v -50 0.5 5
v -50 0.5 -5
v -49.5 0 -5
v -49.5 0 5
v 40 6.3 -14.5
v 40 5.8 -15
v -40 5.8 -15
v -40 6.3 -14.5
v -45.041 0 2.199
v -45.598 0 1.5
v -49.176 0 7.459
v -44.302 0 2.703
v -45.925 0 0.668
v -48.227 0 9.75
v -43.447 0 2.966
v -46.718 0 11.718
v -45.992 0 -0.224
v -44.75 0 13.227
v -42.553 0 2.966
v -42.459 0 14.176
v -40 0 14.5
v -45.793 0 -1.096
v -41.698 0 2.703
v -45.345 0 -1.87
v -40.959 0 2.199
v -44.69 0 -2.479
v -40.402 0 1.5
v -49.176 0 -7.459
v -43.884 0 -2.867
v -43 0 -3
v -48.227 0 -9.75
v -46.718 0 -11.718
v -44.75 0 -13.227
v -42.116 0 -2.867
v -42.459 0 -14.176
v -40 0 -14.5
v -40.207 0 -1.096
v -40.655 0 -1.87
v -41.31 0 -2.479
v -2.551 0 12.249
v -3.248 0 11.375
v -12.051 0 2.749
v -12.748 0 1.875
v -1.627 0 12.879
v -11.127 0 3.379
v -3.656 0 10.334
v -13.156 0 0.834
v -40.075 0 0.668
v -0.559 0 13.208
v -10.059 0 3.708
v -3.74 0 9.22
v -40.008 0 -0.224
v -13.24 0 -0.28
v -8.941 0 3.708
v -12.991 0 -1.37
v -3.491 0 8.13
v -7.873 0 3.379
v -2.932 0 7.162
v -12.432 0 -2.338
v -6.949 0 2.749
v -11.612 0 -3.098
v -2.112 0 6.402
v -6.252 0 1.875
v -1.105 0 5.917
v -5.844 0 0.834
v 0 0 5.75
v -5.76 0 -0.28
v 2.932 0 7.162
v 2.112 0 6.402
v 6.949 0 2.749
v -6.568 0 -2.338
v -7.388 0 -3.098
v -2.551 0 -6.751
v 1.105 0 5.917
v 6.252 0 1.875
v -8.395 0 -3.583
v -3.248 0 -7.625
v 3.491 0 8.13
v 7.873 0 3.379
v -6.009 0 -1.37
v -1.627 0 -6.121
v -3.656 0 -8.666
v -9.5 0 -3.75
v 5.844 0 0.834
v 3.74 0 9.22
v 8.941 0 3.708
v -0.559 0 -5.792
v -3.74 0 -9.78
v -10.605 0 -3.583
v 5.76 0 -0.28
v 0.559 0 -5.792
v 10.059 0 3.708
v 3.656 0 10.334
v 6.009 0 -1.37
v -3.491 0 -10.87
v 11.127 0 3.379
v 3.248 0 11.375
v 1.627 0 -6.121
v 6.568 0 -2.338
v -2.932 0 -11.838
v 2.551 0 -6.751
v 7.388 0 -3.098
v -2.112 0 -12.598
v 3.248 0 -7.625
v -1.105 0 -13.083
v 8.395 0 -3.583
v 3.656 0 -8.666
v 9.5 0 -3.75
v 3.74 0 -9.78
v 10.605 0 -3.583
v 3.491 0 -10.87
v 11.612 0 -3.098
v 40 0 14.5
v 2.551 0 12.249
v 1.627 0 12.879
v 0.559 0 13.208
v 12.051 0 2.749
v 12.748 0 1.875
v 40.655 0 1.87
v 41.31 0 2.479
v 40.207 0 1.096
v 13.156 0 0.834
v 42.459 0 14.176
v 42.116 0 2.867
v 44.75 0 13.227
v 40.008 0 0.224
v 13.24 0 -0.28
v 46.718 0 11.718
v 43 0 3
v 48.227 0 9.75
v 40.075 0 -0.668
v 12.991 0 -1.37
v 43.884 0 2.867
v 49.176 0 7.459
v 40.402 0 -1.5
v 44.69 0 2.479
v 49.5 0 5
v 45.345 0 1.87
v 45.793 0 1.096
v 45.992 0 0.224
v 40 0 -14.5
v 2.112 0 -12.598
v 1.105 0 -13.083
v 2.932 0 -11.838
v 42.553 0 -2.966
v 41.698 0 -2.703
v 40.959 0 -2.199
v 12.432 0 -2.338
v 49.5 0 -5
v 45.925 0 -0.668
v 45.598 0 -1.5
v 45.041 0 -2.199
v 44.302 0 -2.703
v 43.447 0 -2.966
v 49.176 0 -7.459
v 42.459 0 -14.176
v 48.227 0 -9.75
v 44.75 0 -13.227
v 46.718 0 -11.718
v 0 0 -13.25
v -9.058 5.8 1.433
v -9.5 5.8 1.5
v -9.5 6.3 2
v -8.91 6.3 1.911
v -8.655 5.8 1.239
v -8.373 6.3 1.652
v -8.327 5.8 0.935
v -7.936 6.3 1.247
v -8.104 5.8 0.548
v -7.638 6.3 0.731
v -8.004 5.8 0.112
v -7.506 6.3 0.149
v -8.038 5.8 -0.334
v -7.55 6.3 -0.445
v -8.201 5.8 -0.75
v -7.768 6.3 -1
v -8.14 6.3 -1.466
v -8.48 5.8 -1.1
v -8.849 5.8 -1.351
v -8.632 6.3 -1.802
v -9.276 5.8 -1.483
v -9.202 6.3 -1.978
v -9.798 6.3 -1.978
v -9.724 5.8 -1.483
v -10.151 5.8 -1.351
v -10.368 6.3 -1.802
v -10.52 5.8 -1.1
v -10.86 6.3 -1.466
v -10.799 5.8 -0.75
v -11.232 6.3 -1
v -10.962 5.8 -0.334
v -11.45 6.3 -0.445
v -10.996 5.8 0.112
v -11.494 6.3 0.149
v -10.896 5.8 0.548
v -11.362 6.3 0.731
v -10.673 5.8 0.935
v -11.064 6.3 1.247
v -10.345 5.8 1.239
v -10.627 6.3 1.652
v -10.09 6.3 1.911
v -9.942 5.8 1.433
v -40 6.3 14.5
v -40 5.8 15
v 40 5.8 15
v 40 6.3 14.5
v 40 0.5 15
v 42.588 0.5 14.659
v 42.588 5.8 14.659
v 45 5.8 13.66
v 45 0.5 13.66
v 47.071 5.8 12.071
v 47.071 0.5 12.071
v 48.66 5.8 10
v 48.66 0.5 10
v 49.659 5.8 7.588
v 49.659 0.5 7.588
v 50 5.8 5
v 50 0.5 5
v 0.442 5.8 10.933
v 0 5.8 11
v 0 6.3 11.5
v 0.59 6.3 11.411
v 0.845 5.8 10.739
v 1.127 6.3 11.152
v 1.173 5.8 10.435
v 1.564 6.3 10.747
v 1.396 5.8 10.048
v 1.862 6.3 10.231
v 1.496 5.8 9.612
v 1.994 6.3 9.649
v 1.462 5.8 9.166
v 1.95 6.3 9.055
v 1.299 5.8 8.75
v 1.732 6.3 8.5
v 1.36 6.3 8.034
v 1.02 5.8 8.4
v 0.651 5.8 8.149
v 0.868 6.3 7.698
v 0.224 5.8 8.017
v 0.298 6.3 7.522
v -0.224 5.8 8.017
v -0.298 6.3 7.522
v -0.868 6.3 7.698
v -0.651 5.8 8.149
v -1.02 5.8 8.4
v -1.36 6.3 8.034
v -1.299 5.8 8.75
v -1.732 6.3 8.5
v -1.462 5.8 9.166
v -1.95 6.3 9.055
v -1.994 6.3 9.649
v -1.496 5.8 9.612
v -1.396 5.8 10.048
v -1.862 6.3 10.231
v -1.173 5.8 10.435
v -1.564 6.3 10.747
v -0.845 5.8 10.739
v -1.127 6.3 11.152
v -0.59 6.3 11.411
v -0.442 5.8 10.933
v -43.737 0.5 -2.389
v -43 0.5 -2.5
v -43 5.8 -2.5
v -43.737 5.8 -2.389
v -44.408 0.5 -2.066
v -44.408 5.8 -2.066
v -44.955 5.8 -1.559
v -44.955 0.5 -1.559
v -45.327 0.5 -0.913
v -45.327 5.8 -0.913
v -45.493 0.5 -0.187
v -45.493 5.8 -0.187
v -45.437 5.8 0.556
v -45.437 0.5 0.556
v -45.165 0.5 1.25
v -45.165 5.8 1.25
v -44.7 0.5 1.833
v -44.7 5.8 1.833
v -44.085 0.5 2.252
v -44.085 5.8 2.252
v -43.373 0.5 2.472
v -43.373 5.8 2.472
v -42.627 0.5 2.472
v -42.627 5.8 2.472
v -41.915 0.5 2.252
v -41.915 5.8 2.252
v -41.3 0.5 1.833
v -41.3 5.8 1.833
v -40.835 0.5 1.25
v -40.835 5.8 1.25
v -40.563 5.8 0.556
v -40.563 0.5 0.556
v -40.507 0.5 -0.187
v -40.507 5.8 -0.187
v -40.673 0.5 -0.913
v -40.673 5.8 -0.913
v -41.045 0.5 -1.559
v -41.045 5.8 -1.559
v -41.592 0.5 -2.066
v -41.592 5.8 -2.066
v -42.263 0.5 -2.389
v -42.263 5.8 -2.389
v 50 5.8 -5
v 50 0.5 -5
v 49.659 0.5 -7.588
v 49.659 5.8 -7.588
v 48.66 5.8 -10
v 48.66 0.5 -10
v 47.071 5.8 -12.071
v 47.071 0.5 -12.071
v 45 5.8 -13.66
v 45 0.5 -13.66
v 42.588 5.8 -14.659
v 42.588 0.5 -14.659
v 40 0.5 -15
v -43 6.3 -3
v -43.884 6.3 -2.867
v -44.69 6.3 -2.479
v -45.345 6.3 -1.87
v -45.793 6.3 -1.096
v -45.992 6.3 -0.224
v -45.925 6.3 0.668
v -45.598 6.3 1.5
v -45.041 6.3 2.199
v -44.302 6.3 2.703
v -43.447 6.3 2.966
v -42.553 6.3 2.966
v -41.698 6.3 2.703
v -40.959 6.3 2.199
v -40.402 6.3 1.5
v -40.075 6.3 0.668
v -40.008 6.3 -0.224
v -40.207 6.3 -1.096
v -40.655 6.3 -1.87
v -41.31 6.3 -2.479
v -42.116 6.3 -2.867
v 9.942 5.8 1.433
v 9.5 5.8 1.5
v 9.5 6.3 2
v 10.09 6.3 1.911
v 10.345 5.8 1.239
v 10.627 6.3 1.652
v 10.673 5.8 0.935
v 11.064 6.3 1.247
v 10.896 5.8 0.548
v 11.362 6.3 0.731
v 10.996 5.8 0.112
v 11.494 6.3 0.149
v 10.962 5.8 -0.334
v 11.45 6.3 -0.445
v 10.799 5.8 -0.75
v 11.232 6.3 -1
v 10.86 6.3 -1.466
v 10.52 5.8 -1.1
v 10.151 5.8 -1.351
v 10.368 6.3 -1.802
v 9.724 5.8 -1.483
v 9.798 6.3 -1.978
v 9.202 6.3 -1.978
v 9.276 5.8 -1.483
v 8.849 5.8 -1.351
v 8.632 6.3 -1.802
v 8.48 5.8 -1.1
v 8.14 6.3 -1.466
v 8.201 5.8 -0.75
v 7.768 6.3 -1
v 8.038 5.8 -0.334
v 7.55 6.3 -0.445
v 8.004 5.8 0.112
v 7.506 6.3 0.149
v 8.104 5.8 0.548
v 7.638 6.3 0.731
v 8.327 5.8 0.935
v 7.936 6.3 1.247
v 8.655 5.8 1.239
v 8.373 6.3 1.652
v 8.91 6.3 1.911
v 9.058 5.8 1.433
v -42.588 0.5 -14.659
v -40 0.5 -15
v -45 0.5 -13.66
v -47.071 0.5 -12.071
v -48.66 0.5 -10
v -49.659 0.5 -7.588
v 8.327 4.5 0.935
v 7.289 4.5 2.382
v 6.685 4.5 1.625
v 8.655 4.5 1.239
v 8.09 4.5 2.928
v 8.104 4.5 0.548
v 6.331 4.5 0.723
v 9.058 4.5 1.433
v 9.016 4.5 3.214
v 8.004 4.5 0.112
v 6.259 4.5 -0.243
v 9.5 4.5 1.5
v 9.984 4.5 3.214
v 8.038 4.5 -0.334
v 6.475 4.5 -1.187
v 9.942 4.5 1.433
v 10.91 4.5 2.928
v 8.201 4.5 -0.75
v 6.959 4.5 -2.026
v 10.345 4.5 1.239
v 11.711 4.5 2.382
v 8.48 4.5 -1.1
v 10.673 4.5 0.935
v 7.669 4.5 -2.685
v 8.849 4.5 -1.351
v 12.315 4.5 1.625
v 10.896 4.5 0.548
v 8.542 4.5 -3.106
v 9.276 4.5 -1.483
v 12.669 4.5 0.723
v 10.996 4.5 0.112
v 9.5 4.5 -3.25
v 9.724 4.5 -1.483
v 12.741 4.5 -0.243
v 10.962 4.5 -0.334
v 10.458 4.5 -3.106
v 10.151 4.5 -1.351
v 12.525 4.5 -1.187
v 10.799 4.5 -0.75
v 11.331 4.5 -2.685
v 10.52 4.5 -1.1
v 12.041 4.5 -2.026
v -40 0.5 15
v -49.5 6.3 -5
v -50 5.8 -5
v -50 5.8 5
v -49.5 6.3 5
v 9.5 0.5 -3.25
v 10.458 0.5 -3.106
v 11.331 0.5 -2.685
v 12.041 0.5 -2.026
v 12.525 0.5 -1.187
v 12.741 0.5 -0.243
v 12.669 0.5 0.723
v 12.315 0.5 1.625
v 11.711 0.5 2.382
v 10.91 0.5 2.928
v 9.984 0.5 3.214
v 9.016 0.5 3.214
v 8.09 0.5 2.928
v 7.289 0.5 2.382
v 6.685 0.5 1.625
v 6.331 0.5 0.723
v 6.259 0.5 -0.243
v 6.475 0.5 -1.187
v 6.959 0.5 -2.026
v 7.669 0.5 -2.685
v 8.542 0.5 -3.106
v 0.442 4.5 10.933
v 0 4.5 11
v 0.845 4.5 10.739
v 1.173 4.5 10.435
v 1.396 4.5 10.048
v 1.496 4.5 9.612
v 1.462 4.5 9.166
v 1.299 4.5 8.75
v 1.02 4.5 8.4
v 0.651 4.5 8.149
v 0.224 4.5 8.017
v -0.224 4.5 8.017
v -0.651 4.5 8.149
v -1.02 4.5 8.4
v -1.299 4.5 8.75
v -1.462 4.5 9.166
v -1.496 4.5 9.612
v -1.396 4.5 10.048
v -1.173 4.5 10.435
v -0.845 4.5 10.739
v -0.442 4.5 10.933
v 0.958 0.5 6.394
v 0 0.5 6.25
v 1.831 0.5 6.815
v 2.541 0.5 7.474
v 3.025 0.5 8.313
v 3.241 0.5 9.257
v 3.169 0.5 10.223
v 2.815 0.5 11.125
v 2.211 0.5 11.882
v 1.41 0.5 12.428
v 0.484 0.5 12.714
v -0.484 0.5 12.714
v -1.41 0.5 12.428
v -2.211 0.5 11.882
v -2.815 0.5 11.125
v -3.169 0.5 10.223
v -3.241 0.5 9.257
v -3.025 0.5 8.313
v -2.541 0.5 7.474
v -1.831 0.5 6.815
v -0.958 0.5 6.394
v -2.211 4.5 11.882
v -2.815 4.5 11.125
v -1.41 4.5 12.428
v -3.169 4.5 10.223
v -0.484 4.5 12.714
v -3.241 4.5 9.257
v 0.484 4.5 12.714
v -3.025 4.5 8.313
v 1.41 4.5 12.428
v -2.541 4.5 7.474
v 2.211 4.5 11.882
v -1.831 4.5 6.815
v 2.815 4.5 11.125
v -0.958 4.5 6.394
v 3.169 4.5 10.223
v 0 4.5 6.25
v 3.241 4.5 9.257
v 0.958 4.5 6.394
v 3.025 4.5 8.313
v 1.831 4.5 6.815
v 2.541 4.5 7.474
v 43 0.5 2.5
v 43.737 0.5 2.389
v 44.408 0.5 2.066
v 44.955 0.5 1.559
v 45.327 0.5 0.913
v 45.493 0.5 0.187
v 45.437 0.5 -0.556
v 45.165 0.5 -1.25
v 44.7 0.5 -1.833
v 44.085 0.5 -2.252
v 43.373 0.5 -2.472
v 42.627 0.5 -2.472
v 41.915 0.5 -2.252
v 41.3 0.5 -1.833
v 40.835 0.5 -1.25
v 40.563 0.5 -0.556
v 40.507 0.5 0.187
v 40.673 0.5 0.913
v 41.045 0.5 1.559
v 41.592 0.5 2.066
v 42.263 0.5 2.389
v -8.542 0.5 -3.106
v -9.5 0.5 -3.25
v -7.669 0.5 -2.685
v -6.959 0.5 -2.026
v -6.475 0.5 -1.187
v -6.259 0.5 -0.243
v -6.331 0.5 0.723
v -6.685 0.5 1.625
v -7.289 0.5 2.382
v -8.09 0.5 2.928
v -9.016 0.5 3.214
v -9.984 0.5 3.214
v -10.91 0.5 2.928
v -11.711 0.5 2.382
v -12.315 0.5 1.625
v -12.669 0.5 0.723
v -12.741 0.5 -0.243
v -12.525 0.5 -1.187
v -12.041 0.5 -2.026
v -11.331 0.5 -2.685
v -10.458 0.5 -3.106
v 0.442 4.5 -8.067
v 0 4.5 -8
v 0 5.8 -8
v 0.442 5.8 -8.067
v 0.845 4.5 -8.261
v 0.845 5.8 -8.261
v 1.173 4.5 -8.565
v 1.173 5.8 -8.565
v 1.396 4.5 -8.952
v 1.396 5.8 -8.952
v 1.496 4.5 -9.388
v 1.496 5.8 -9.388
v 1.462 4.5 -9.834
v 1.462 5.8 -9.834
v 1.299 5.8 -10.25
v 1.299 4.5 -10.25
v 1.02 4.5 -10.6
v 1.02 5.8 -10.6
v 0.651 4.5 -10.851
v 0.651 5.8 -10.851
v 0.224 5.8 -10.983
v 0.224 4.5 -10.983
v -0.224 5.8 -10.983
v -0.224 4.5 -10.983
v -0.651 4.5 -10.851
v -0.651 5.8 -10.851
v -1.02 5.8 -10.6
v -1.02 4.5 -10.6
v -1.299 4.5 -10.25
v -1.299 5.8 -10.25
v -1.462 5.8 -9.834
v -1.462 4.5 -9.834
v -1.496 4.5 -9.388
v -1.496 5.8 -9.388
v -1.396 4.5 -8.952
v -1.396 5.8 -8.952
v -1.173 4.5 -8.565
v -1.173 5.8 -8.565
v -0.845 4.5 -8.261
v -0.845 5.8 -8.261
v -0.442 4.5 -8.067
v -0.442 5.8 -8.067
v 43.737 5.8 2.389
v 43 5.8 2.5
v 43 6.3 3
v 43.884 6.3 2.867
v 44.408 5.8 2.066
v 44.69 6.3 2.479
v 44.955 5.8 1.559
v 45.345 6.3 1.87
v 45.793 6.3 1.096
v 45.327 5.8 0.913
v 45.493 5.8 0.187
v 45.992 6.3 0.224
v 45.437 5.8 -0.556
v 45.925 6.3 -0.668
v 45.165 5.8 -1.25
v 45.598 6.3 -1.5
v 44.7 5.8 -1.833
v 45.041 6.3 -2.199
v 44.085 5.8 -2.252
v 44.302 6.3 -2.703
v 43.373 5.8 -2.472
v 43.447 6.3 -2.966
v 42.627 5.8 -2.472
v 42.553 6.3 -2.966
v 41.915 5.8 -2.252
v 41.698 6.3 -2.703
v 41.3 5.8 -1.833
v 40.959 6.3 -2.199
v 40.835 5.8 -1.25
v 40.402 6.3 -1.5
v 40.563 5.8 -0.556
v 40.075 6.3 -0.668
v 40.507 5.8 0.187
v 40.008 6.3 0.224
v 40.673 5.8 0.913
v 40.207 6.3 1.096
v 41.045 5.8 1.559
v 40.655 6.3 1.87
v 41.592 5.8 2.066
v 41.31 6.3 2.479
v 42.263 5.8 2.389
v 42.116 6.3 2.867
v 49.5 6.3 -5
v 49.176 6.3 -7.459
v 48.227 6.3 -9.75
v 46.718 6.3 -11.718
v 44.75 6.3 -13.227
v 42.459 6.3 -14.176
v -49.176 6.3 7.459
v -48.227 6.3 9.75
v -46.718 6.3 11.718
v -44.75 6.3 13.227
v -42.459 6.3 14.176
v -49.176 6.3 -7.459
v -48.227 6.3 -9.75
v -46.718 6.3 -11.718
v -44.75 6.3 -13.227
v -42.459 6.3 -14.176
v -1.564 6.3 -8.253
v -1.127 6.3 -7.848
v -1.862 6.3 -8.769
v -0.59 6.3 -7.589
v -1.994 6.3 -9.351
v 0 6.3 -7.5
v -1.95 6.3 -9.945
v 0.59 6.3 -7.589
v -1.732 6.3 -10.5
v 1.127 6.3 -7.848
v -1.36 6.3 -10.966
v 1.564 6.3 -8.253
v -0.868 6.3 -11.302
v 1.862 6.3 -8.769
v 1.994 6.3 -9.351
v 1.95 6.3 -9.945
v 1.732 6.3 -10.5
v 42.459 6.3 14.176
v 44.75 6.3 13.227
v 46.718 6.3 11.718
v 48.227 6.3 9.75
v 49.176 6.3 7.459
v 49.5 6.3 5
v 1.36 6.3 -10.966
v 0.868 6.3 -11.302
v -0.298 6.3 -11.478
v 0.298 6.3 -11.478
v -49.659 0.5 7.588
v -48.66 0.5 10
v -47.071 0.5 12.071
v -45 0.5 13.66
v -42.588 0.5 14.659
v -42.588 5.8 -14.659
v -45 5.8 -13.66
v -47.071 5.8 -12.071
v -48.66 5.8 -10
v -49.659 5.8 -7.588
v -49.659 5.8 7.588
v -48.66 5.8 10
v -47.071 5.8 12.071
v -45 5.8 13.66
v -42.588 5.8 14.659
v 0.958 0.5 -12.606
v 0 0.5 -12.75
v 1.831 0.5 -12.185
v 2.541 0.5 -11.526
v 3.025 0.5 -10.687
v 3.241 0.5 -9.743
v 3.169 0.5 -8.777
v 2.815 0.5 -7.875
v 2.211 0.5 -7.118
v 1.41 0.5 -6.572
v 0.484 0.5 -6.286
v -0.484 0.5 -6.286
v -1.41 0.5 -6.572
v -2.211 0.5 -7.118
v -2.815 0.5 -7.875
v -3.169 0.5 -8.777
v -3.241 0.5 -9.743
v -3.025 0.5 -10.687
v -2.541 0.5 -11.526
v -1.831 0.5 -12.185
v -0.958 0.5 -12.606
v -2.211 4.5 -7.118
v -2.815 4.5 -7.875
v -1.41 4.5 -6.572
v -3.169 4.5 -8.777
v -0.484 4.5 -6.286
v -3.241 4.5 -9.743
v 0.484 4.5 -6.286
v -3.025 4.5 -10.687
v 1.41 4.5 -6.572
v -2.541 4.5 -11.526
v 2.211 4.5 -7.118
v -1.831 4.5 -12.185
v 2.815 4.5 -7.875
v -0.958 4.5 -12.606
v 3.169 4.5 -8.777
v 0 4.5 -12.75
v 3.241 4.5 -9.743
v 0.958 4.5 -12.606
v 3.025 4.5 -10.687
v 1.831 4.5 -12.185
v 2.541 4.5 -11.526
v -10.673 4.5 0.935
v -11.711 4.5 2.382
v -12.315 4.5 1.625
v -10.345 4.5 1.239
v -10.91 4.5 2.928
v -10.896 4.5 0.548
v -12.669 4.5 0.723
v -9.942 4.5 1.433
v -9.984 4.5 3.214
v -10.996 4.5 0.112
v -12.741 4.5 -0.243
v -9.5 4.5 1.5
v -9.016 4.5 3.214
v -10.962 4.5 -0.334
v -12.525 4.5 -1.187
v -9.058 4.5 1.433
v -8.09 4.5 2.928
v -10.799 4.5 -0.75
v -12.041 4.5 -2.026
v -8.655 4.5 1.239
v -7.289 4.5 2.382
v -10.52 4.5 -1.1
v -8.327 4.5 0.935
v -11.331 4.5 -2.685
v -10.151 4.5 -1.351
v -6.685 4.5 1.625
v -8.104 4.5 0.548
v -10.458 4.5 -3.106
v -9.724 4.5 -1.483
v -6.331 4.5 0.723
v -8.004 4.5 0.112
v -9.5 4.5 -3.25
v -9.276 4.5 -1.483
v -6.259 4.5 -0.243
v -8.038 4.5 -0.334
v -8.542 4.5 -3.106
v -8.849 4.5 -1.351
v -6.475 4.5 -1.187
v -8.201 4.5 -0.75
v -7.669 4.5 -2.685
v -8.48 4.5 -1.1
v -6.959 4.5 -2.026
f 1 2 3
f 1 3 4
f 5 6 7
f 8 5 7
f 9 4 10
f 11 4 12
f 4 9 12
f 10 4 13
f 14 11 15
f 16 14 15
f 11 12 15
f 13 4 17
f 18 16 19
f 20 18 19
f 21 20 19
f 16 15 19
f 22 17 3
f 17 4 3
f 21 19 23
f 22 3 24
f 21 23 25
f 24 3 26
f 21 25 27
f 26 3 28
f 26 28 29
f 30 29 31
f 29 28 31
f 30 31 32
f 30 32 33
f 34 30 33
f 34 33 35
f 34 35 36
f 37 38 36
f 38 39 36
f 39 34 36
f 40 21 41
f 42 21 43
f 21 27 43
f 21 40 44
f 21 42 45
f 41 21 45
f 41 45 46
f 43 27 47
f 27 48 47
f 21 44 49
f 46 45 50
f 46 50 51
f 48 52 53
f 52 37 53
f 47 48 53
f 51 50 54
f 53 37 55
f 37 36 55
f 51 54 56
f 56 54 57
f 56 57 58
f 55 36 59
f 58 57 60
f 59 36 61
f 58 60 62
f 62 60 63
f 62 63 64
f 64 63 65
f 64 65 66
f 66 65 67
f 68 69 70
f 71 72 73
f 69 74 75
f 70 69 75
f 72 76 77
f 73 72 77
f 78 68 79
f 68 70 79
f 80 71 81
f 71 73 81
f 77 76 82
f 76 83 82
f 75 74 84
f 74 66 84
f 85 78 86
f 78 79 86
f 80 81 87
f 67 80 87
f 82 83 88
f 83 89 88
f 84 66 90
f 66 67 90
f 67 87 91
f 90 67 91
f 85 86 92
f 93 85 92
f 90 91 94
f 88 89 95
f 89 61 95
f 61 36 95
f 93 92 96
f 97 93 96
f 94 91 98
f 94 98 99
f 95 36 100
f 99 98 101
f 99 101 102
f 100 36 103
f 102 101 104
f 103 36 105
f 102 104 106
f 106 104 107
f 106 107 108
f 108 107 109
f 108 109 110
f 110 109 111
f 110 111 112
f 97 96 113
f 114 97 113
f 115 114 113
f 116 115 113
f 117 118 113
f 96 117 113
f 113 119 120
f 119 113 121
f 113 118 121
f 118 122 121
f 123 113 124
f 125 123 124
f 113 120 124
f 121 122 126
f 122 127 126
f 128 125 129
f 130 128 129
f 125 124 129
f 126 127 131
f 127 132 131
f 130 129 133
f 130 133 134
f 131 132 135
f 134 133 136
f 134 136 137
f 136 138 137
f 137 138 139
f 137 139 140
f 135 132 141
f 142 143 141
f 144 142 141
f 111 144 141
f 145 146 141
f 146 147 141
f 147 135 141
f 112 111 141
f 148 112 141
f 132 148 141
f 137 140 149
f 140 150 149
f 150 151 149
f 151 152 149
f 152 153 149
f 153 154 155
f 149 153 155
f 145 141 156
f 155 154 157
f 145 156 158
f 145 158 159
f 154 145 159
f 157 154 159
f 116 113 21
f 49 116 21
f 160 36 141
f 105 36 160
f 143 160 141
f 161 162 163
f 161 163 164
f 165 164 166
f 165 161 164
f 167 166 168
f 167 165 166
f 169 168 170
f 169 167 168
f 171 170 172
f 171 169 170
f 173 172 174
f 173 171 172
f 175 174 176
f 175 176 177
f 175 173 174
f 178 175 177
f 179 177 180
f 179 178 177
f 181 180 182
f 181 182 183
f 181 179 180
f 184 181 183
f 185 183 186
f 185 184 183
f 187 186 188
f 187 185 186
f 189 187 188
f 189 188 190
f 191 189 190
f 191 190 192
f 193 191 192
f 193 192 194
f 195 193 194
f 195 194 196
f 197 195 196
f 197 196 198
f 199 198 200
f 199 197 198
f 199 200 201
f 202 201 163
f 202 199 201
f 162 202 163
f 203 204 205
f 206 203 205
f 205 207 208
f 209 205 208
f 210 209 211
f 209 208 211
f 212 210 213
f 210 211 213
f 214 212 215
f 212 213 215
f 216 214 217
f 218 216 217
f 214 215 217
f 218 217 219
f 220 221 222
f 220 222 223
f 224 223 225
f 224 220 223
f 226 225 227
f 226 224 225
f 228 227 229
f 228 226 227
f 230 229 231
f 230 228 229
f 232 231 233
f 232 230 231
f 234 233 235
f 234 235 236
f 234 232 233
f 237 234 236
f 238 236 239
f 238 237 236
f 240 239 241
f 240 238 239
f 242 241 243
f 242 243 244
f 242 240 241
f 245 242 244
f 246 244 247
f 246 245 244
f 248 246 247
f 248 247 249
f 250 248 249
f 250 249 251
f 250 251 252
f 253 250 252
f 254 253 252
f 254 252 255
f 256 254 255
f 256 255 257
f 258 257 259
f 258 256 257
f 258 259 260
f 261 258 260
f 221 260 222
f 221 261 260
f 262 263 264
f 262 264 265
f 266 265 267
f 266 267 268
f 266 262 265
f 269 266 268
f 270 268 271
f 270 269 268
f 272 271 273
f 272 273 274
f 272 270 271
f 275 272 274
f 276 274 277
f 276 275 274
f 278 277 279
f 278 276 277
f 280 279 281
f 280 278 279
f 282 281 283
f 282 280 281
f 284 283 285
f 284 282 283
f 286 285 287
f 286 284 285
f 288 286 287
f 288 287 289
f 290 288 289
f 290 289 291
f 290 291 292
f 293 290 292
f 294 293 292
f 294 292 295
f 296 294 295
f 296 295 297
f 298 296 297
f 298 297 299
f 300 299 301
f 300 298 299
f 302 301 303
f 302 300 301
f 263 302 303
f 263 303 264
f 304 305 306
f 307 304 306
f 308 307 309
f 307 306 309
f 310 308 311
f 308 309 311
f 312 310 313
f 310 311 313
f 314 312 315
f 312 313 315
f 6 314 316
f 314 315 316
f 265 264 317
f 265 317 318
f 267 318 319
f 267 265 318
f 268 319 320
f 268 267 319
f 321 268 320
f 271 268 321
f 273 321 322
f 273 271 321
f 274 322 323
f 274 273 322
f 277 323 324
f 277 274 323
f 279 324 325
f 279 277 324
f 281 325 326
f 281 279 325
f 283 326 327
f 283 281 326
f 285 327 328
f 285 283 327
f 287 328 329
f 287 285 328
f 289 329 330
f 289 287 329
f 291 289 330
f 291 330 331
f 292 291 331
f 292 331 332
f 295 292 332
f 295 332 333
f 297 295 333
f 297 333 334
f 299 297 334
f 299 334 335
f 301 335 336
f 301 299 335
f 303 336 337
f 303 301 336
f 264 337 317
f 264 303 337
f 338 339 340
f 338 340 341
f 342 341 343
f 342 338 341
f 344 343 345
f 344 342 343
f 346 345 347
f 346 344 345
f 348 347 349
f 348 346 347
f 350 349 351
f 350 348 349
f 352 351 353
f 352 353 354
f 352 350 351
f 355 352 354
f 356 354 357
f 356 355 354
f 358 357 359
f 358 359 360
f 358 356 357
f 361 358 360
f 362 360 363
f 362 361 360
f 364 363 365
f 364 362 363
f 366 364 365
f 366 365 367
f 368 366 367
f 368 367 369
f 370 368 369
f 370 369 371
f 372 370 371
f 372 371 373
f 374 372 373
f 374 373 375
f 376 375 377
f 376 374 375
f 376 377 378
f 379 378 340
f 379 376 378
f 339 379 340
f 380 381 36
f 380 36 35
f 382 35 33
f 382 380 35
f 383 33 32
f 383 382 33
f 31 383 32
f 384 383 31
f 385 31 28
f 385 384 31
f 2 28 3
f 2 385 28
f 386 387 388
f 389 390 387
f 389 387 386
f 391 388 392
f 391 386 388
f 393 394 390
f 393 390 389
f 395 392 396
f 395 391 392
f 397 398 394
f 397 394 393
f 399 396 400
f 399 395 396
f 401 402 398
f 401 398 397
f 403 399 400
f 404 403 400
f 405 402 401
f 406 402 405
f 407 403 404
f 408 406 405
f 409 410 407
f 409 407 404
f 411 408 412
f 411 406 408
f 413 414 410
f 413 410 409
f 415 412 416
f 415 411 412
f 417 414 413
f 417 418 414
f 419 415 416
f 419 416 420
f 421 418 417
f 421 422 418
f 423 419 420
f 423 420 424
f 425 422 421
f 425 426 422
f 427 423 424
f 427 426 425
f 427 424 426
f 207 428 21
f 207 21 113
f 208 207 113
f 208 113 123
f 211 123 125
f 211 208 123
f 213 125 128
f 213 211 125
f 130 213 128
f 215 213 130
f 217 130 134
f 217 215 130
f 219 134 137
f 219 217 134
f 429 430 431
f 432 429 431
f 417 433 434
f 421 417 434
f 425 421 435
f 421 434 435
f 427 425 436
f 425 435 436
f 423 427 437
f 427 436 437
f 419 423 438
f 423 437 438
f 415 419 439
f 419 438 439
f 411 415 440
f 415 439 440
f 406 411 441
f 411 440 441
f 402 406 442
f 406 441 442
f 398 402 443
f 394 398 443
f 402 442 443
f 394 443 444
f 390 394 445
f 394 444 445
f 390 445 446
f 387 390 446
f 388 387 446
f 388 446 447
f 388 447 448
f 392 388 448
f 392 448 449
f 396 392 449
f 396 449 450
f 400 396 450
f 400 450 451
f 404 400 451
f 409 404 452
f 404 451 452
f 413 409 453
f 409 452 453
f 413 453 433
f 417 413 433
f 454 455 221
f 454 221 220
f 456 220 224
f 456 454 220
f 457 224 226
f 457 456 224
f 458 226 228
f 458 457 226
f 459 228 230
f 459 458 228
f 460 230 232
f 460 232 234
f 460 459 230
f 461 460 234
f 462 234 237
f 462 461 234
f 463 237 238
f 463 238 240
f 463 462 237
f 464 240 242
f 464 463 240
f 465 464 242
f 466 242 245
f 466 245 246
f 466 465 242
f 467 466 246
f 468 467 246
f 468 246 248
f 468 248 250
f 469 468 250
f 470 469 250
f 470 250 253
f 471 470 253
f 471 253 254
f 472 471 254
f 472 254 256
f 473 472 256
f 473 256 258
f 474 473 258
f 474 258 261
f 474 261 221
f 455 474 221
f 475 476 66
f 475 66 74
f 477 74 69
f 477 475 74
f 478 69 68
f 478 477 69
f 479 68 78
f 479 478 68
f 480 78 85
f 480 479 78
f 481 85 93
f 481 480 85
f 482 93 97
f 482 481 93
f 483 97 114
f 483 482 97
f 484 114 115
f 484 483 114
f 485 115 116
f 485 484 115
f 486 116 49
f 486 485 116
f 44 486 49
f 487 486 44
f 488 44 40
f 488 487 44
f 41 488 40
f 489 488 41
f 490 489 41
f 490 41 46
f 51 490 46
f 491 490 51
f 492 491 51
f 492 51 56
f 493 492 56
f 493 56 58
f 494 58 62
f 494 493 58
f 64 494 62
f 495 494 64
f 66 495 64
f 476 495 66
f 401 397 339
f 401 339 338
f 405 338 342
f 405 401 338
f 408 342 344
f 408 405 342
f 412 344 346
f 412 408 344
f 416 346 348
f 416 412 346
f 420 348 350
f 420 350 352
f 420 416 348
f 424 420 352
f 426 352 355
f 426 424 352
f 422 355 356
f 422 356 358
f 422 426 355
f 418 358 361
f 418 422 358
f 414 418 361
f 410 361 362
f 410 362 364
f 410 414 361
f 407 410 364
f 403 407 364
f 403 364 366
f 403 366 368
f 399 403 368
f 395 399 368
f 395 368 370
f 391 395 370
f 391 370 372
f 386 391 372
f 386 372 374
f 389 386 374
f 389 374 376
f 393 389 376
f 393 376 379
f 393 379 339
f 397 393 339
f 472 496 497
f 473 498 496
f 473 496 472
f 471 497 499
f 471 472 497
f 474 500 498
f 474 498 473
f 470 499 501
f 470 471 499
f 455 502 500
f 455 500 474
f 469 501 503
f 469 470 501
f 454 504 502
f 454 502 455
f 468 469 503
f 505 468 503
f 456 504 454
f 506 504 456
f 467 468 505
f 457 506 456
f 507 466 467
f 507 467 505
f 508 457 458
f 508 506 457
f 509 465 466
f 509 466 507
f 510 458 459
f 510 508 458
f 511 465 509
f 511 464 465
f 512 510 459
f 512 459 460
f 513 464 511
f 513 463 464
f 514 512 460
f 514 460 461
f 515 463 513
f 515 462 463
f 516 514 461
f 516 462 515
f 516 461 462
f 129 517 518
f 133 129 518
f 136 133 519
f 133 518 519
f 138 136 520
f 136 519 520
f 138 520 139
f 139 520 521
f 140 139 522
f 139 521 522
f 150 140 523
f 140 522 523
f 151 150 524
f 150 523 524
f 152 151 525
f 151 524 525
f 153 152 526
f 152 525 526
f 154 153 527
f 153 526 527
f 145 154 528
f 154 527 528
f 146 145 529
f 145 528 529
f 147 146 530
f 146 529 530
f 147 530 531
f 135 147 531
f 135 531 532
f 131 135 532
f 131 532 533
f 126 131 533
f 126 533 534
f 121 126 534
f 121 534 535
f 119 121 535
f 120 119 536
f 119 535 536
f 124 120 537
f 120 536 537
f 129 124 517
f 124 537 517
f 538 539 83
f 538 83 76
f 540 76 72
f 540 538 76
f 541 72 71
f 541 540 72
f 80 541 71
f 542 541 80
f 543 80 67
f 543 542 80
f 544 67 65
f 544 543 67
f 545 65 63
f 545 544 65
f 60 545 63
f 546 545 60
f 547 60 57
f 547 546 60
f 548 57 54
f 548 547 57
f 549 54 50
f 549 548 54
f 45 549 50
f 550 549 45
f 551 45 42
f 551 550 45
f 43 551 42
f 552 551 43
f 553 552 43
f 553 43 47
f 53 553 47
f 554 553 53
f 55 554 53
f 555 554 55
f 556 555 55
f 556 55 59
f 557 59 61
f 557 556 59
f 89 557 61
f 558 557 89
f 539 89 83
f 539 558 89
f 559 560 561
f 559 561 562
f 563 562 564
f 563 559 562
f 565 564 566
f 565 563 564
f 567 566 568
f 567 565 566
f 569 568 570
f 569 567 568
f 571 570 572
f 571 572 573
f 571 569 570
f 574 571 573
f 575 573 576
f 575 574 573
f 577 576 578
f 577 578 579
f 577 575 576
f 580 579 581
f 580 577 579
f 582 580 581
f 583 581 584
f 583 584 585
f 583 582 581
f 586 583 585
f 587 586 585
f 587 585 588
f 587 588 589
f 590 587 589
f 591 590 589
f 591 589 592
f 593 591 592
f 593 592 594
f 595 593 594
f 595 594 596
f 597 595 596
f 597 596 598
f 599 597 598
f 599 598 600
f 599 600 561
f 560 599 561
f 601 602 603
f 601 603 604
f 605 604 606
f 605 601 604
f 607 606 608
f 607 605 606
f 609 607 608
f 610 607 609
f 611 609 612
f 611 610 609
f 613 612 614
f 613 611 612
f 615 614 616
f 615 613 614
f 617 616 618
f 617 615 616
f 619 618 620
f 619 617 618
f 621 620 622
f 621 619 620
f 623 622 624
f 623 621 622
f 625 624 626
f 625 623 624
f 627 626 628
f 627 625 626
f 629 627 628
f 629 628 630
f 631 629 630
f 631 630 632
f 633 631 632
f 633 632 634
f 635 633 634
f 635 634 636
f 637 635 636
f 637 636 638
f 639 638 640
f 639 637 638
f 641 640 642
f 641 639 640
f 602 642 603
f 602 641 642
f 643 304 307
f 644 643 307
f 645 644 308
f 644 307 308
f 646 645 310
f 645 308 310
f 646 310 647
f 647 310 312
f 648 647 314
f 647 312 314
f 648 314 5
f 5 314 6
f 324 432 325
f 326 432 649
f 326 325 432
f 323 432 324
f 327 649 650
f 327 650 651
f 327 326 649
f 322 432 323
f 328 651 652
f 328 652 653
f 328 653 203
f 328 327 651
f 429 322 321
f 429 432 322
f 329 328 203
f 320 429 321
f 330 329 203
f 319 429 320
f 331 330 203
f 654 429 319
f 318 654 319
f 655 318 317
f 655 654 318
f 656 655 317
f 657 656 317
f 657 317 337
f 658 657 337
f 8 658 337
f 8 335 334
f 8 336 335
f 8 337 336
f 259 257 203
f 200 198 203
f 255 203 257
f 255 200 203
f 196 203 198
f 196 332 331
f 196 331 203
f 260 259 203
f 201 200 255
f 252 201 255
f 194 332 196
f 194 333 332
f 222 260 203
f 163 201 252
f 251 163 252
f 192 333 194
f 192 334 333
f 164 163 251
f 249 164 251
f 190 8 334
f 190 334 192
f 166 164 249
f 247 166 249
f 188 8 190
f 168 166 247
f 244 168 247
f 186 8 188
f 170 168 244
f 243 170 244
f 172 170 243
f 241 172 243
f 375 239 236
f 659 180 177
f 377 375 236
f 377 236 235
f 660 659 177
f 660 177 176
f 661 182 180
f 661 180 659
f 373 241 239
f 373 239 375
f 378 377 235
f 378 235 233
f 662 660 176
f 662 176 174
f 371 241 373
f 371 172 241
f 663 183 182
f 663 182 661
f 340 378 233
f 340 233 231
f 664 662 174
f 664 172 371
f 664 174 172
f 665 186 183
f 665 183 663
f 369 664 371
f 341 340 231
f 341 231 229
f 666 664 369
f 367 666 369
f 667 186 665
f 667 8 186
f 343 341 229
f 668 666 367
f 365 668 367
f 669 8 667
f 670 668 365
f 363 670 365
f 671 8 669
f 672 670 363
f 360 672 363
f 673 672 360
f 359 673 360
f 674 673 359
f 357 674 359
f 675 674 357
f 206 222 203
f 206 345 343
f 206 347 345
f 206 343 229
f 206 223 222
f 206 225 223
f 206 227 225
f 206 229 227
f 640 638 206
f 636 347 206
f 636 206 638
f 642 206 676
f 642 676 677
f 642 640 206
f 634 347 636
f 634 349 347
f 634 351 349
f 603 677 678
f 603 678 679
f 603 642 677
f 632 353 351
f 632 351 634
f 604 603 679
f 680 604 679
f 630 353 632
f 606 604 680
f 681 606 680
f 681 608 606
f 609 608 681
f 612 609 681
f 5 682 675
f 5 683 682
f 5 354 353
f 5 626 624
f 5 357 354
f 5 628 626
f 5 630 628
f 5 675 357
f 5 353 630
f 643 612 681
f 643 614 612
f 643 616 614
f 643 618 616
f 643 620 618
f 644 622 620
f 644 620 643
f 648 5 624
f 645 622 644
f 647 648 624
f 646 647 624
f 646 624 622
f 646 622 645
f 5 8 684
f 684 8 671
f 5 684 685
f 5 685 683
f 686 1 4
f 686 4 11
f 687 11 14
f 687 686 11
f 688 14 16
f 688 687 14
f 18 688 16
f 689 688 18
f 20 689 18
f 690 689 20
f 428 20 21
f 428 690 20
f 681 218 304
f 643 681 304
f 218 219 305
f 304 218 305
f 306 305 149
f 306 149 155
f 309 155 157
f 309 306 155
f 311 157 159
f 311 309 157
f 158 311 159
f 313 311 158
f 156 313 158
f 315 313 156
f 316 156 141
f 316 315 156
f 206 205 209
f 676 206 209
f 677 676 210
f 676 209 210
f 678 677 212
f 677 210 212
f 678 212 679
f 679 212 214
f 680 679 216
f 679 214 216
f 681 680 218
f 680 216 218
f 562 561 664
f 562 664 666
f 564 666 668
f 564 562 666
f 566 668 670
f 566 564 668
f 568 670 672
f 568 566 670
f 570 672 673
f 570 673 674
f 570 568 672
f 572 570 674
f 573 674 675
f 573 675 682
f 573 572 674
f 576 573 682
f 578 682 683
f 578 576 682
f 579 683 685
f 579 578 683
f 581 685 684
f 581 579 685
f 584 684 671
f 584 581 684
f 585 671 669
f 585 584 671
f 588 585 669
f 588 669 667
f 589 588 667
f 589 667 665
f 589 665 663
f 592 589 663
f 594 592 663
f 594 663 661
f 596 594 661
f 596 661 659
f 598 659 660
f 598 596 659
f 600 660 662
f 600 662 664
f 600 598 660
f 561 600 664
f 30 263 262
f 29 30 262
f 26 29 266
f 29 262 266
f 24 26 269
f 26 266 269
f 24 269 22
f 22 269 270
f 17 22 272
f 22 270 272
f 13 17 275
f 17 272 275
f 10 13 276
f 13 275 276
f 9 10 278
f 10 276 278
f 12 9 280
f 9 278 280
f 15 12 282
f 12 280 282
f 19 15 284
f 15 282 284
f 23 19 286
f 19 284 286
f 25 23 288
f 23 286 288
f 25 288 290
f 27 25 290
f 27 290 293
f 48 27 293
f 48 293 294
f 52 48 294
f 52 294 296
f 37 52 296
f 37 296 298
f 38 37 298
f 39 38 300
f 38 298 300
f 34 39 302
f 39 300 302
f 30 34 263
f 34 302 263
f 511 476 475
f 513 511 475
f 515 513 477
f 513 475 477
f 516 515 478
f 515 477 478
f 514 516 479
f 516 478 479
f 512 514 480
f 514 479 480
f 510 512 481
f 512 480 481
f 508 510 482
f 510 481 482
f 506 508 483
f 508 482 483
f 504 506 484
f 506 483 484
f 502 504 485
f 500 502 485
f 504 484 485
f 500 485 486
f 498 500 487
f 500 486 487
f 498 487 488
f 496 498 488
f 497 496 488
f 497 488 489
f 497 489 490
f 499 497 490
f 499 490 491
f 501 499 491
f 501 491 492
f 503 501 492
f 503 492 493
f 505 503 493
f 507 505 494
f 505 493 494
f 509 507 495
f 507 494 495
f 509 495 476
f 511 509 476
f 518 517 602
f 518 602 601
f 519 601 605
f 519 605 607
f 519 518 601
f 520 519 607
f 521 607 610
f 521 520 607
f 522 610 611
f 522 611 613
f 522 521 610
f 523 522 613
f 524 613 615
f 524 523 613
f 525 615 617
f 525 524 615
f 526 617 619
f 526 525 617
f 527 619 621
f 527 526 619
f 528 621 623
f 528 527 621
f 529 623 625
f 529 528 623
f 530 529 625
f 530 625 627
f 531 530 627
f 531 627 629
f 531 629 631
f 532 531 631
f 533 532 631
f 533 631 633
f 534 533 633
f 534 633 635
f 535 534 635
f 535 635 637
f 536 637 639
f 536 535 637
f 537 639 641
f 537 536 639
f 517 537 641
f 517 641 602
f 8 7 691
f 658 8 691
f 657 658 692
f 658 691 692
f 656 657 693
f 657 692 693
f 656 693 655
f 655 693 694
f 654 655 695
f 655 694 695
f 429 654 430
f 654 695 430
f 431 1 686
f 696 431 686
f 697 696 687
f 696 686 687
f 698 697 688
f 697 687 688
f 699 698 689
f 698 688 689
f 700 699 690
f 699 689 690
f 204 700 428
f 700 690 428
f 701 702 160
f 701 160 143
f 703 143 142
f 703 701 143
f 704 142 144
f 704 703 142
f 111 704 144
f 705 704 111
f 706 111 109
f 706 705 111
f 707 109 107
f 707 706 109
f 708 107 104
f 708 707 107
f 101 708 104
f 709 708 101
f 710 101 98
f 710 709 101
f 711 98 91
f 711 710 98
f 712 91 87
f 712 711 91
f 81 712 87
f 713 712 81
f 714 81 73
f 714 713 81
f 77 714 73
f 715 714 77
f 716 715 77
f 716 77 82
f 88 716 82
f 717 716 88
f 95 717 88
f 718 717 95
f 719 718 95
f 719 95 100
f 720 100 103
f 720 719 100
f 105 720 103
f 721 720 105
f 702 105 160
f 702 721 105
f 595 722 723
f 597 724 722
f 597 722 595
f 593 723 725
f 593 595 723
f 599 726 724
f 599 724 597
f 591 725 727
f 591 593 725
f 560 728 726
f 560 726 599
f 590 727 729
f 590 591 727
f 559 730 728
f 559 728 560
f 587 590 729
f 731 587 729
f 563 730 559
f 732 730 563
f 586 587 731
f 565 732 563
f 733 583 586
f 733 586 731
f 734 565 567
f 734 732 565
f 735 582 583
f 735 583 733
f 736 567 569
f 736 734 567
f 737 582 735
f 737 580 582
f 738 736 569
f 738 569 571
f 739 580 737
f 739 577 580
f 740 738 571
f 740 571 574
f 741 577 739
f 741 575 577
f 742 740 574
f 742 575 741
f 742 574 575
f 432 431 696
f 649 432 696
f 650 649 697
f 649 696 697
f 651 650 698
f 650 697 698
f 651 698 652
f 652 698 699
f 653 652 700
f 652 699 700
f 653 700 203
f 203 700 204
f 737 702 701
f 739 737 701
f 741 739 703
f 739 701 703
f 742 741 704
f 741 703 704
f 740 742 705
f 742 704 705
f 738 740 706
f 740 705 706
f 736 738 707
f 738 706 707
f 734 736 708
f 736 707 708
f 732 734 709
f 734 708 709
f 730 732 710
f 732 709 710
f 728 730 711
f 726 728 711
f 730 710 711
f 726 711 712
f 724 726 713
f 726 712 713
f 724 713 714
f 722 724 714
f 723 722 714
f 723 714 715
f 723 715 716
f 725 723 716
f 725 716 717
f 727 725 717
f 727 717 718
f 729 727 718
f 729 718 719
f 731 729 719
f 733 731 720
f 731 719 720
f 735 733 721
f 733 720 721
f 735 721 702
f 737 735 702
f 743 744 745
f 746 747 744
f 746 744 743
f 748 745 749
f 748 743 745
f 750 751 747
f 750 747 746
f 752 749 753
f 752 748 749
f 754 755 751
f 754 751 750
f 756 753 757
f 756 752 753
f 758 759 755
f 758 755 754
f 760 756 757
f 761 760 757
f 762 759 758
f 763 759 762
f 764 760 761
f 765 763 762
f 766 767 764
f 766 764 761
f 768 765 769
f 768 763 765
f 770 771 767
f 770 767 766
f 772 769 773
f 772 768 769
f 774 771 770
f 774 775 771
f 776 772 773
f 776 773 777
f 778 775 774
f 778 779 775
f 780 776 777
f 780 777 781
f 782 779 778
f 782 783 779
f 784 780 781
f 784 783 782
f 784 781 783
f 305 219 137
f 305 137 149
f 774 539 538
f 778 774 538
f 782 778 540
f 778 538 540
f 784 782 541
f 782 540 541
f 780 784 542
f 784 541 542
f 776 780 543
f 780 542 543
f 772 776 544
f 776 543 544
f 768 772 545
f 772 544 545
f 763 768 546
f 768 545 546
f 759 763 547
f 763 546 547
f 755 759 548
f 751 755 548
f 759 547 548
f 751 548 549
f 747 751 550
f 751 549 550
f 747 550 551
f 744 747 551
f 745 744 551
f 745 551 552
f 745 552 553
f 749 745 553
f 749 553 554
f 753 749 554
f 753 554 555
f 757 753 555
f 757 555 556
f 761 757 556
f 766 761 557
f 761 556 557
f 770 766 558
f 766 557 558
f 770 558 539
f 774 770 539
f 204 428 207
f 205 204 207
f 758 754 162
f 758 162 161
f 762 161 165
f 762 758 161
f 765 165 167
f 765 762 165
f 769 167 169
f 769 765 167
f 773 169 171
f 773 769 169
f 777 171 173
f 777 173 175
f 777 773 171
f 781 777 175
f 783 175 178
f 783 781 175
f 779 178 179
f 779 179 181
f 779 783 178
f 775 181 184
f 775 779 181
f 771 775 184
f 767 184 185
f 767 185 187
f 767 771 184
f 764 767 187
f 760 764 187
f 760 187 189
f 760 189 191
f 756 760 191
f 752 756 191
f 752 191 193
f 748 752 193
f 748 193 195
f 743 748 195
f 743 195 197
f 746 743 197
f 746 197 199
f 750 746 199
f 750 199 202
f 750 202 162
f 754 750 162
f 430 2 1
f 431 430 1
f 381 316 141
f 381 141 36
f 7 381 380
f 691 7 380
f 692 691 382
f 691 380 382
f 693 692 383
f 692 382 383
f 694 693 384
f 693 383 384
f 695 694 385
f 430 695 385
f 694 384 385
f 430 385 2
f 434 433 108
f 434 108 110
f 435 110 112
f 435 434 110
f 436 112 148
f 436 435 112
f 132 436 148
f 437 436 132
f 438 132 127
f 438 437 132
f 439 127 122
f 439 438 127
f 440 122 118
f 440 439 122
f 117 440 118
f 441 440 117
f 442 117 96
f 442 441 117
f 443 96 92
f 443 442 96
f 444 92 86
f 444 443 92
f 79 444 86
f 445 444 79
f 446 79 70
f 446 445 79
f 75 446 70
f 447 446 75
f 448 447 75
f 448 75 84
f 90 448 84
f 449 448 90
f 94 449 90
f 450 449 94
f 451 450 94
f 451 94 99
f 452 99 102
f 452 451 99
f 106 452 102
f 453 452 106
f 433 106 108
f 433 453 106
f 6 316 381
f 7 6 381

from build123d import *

# Parameters (mm, degrees)
SKETCH1_R           = 2.5
SKETCH1_R_2         = 1.5
BOSS_EXTRUDE1_DEPTH = 6.3
SKETCH2_R           = 3.25
CUT_EXTRUDE1_DEPTH  = 4.5
CHAMFER1_SIZE       = 0.5


with BuildPart() as part:
    # Sketch1 → Boss-Extrude1 (new body)
    with BuildSketch(Plane(origin=(0, 0, 0), x_dir=(1, 0, 0), z_dir=(0, 1, 0))):
        with BuildLine():
            Line((40, 15), (-40, 15))
            ThreePointArc((-40, 15), (-47.071067812, 12.071067812), (-50, 5))
            Line((-50, 5), (-50, -5))
            ThreePointArc((-50, -5), (-47.071067812, -12.071067812), (-40, -15))
            Line((-40, -15), (40, -15))
            ThreePointArc((40, -15), (47.071067812, -12.071067812), (50, -5))
            Line((50, -5), (50, 5))
            ThreePointArc((50, 5), (47.071067812, 12.071067812), (40, 15))
        make_face()
        with Locations(Location((43, 0, 0), (0, 0, 270))):
            Circle(SKETCH1_R, mode=Mode.SUBTRACT)
        with Locations(Location((-43, 0, 0), (0, 0, 90))):
            Circle(SKETCH1_R, mode=Mode.SUBTRACT)
        with Locations(Location((0, -9.5, 0), (0, 0, 270))):
            Circle(SKETCH1_R_2, mode=Mode.SUBTRACT)
        with Locations(Location((-9.5, 0, 0), (0, 0, 270))):
            Circle(SKETCH1_R_2, mode=Mode.SUBTRACT)
        with Locations(Location((0, 9.5, 0), (0, 0, 270))):
            Circle(SKETCH1_R_2, mode=Mode.SUBTRACT)
        with Locations(Location((9.5, 0, 0), (0, 0, 270))):
            Circle(SKETCH1_R_2, mode=Mode.SUBTRACT)
    extrude(amount=BOSS_EXTRUDE1_DEPTH)

    # Sketch2 → Cut-Extrude1 (cut)
    with BuildSketch(Plane.XZ):
        with Locations(Location((0, 9.5, 0), (0, 0, 270))):
            Circle(SKETCH2_R)
        with Locations(Location((9.5, 0, 0), (0, 0, 270))):
            Circle(SKETCH2_R)
        with Locations(Location((0, -9.5, 0), (0, 0, 270))):
            Circle(SKETCH2_R)
        with Locations(Location((-9.5, 0, 0), (0, 0, 270))):
            Circle(SKETCH2_R)
    extrude(amount=-CUT_EXTRUDE1_DEPTH, mode=Mode.SUBTRACT)

    # Chamfer1
    chamfer1_edges = [part.edges().sort_by_distance(p)[0] for p in [
        (0, 0, 15),
        (-47.071067812, 0, 12.071067812),
        (-50, 0, 0),
        (-47.071067812, 0, -12.071067812),
        (-47.071067812, 6.3, 12.071067812),
        (0, 6.3, 15),
        (47.071067812, 6.3, 12.071067812),
        (43, 0, -2.5),
        (43, 6.3, -2.5),
        (50, 6.3, 0),
        (-43, 0, 2.5),
        (-43, 6.3, 2.5),
        (47.071067812, 6.3, -12.071067812),
        (0, 6.3, 8),
        (0, 6.3, -15),
        (-9.5, 6.3, -1.5),
        (0, 6.3, -11),
        (9.5, 6.3, -1.5),
        (-47.071067812, 6.3, -12.071067812),
        (0, 0, 12.75),
        (9.5, 0, 3.25),
        (0, 0, -6.25),
        (-9.5, 0, 3.25),
        (0, 0, -15),
        (-50, 6.3, 0),
        (47.071067812, 0, -12.071067812),
        (50, 0, 0),
        (47.071067812, 0, 12.071067812),
    ]]
    chamfer(chamfer1_edges, length=CHAMFER1_SIZE)


solid = part.part
